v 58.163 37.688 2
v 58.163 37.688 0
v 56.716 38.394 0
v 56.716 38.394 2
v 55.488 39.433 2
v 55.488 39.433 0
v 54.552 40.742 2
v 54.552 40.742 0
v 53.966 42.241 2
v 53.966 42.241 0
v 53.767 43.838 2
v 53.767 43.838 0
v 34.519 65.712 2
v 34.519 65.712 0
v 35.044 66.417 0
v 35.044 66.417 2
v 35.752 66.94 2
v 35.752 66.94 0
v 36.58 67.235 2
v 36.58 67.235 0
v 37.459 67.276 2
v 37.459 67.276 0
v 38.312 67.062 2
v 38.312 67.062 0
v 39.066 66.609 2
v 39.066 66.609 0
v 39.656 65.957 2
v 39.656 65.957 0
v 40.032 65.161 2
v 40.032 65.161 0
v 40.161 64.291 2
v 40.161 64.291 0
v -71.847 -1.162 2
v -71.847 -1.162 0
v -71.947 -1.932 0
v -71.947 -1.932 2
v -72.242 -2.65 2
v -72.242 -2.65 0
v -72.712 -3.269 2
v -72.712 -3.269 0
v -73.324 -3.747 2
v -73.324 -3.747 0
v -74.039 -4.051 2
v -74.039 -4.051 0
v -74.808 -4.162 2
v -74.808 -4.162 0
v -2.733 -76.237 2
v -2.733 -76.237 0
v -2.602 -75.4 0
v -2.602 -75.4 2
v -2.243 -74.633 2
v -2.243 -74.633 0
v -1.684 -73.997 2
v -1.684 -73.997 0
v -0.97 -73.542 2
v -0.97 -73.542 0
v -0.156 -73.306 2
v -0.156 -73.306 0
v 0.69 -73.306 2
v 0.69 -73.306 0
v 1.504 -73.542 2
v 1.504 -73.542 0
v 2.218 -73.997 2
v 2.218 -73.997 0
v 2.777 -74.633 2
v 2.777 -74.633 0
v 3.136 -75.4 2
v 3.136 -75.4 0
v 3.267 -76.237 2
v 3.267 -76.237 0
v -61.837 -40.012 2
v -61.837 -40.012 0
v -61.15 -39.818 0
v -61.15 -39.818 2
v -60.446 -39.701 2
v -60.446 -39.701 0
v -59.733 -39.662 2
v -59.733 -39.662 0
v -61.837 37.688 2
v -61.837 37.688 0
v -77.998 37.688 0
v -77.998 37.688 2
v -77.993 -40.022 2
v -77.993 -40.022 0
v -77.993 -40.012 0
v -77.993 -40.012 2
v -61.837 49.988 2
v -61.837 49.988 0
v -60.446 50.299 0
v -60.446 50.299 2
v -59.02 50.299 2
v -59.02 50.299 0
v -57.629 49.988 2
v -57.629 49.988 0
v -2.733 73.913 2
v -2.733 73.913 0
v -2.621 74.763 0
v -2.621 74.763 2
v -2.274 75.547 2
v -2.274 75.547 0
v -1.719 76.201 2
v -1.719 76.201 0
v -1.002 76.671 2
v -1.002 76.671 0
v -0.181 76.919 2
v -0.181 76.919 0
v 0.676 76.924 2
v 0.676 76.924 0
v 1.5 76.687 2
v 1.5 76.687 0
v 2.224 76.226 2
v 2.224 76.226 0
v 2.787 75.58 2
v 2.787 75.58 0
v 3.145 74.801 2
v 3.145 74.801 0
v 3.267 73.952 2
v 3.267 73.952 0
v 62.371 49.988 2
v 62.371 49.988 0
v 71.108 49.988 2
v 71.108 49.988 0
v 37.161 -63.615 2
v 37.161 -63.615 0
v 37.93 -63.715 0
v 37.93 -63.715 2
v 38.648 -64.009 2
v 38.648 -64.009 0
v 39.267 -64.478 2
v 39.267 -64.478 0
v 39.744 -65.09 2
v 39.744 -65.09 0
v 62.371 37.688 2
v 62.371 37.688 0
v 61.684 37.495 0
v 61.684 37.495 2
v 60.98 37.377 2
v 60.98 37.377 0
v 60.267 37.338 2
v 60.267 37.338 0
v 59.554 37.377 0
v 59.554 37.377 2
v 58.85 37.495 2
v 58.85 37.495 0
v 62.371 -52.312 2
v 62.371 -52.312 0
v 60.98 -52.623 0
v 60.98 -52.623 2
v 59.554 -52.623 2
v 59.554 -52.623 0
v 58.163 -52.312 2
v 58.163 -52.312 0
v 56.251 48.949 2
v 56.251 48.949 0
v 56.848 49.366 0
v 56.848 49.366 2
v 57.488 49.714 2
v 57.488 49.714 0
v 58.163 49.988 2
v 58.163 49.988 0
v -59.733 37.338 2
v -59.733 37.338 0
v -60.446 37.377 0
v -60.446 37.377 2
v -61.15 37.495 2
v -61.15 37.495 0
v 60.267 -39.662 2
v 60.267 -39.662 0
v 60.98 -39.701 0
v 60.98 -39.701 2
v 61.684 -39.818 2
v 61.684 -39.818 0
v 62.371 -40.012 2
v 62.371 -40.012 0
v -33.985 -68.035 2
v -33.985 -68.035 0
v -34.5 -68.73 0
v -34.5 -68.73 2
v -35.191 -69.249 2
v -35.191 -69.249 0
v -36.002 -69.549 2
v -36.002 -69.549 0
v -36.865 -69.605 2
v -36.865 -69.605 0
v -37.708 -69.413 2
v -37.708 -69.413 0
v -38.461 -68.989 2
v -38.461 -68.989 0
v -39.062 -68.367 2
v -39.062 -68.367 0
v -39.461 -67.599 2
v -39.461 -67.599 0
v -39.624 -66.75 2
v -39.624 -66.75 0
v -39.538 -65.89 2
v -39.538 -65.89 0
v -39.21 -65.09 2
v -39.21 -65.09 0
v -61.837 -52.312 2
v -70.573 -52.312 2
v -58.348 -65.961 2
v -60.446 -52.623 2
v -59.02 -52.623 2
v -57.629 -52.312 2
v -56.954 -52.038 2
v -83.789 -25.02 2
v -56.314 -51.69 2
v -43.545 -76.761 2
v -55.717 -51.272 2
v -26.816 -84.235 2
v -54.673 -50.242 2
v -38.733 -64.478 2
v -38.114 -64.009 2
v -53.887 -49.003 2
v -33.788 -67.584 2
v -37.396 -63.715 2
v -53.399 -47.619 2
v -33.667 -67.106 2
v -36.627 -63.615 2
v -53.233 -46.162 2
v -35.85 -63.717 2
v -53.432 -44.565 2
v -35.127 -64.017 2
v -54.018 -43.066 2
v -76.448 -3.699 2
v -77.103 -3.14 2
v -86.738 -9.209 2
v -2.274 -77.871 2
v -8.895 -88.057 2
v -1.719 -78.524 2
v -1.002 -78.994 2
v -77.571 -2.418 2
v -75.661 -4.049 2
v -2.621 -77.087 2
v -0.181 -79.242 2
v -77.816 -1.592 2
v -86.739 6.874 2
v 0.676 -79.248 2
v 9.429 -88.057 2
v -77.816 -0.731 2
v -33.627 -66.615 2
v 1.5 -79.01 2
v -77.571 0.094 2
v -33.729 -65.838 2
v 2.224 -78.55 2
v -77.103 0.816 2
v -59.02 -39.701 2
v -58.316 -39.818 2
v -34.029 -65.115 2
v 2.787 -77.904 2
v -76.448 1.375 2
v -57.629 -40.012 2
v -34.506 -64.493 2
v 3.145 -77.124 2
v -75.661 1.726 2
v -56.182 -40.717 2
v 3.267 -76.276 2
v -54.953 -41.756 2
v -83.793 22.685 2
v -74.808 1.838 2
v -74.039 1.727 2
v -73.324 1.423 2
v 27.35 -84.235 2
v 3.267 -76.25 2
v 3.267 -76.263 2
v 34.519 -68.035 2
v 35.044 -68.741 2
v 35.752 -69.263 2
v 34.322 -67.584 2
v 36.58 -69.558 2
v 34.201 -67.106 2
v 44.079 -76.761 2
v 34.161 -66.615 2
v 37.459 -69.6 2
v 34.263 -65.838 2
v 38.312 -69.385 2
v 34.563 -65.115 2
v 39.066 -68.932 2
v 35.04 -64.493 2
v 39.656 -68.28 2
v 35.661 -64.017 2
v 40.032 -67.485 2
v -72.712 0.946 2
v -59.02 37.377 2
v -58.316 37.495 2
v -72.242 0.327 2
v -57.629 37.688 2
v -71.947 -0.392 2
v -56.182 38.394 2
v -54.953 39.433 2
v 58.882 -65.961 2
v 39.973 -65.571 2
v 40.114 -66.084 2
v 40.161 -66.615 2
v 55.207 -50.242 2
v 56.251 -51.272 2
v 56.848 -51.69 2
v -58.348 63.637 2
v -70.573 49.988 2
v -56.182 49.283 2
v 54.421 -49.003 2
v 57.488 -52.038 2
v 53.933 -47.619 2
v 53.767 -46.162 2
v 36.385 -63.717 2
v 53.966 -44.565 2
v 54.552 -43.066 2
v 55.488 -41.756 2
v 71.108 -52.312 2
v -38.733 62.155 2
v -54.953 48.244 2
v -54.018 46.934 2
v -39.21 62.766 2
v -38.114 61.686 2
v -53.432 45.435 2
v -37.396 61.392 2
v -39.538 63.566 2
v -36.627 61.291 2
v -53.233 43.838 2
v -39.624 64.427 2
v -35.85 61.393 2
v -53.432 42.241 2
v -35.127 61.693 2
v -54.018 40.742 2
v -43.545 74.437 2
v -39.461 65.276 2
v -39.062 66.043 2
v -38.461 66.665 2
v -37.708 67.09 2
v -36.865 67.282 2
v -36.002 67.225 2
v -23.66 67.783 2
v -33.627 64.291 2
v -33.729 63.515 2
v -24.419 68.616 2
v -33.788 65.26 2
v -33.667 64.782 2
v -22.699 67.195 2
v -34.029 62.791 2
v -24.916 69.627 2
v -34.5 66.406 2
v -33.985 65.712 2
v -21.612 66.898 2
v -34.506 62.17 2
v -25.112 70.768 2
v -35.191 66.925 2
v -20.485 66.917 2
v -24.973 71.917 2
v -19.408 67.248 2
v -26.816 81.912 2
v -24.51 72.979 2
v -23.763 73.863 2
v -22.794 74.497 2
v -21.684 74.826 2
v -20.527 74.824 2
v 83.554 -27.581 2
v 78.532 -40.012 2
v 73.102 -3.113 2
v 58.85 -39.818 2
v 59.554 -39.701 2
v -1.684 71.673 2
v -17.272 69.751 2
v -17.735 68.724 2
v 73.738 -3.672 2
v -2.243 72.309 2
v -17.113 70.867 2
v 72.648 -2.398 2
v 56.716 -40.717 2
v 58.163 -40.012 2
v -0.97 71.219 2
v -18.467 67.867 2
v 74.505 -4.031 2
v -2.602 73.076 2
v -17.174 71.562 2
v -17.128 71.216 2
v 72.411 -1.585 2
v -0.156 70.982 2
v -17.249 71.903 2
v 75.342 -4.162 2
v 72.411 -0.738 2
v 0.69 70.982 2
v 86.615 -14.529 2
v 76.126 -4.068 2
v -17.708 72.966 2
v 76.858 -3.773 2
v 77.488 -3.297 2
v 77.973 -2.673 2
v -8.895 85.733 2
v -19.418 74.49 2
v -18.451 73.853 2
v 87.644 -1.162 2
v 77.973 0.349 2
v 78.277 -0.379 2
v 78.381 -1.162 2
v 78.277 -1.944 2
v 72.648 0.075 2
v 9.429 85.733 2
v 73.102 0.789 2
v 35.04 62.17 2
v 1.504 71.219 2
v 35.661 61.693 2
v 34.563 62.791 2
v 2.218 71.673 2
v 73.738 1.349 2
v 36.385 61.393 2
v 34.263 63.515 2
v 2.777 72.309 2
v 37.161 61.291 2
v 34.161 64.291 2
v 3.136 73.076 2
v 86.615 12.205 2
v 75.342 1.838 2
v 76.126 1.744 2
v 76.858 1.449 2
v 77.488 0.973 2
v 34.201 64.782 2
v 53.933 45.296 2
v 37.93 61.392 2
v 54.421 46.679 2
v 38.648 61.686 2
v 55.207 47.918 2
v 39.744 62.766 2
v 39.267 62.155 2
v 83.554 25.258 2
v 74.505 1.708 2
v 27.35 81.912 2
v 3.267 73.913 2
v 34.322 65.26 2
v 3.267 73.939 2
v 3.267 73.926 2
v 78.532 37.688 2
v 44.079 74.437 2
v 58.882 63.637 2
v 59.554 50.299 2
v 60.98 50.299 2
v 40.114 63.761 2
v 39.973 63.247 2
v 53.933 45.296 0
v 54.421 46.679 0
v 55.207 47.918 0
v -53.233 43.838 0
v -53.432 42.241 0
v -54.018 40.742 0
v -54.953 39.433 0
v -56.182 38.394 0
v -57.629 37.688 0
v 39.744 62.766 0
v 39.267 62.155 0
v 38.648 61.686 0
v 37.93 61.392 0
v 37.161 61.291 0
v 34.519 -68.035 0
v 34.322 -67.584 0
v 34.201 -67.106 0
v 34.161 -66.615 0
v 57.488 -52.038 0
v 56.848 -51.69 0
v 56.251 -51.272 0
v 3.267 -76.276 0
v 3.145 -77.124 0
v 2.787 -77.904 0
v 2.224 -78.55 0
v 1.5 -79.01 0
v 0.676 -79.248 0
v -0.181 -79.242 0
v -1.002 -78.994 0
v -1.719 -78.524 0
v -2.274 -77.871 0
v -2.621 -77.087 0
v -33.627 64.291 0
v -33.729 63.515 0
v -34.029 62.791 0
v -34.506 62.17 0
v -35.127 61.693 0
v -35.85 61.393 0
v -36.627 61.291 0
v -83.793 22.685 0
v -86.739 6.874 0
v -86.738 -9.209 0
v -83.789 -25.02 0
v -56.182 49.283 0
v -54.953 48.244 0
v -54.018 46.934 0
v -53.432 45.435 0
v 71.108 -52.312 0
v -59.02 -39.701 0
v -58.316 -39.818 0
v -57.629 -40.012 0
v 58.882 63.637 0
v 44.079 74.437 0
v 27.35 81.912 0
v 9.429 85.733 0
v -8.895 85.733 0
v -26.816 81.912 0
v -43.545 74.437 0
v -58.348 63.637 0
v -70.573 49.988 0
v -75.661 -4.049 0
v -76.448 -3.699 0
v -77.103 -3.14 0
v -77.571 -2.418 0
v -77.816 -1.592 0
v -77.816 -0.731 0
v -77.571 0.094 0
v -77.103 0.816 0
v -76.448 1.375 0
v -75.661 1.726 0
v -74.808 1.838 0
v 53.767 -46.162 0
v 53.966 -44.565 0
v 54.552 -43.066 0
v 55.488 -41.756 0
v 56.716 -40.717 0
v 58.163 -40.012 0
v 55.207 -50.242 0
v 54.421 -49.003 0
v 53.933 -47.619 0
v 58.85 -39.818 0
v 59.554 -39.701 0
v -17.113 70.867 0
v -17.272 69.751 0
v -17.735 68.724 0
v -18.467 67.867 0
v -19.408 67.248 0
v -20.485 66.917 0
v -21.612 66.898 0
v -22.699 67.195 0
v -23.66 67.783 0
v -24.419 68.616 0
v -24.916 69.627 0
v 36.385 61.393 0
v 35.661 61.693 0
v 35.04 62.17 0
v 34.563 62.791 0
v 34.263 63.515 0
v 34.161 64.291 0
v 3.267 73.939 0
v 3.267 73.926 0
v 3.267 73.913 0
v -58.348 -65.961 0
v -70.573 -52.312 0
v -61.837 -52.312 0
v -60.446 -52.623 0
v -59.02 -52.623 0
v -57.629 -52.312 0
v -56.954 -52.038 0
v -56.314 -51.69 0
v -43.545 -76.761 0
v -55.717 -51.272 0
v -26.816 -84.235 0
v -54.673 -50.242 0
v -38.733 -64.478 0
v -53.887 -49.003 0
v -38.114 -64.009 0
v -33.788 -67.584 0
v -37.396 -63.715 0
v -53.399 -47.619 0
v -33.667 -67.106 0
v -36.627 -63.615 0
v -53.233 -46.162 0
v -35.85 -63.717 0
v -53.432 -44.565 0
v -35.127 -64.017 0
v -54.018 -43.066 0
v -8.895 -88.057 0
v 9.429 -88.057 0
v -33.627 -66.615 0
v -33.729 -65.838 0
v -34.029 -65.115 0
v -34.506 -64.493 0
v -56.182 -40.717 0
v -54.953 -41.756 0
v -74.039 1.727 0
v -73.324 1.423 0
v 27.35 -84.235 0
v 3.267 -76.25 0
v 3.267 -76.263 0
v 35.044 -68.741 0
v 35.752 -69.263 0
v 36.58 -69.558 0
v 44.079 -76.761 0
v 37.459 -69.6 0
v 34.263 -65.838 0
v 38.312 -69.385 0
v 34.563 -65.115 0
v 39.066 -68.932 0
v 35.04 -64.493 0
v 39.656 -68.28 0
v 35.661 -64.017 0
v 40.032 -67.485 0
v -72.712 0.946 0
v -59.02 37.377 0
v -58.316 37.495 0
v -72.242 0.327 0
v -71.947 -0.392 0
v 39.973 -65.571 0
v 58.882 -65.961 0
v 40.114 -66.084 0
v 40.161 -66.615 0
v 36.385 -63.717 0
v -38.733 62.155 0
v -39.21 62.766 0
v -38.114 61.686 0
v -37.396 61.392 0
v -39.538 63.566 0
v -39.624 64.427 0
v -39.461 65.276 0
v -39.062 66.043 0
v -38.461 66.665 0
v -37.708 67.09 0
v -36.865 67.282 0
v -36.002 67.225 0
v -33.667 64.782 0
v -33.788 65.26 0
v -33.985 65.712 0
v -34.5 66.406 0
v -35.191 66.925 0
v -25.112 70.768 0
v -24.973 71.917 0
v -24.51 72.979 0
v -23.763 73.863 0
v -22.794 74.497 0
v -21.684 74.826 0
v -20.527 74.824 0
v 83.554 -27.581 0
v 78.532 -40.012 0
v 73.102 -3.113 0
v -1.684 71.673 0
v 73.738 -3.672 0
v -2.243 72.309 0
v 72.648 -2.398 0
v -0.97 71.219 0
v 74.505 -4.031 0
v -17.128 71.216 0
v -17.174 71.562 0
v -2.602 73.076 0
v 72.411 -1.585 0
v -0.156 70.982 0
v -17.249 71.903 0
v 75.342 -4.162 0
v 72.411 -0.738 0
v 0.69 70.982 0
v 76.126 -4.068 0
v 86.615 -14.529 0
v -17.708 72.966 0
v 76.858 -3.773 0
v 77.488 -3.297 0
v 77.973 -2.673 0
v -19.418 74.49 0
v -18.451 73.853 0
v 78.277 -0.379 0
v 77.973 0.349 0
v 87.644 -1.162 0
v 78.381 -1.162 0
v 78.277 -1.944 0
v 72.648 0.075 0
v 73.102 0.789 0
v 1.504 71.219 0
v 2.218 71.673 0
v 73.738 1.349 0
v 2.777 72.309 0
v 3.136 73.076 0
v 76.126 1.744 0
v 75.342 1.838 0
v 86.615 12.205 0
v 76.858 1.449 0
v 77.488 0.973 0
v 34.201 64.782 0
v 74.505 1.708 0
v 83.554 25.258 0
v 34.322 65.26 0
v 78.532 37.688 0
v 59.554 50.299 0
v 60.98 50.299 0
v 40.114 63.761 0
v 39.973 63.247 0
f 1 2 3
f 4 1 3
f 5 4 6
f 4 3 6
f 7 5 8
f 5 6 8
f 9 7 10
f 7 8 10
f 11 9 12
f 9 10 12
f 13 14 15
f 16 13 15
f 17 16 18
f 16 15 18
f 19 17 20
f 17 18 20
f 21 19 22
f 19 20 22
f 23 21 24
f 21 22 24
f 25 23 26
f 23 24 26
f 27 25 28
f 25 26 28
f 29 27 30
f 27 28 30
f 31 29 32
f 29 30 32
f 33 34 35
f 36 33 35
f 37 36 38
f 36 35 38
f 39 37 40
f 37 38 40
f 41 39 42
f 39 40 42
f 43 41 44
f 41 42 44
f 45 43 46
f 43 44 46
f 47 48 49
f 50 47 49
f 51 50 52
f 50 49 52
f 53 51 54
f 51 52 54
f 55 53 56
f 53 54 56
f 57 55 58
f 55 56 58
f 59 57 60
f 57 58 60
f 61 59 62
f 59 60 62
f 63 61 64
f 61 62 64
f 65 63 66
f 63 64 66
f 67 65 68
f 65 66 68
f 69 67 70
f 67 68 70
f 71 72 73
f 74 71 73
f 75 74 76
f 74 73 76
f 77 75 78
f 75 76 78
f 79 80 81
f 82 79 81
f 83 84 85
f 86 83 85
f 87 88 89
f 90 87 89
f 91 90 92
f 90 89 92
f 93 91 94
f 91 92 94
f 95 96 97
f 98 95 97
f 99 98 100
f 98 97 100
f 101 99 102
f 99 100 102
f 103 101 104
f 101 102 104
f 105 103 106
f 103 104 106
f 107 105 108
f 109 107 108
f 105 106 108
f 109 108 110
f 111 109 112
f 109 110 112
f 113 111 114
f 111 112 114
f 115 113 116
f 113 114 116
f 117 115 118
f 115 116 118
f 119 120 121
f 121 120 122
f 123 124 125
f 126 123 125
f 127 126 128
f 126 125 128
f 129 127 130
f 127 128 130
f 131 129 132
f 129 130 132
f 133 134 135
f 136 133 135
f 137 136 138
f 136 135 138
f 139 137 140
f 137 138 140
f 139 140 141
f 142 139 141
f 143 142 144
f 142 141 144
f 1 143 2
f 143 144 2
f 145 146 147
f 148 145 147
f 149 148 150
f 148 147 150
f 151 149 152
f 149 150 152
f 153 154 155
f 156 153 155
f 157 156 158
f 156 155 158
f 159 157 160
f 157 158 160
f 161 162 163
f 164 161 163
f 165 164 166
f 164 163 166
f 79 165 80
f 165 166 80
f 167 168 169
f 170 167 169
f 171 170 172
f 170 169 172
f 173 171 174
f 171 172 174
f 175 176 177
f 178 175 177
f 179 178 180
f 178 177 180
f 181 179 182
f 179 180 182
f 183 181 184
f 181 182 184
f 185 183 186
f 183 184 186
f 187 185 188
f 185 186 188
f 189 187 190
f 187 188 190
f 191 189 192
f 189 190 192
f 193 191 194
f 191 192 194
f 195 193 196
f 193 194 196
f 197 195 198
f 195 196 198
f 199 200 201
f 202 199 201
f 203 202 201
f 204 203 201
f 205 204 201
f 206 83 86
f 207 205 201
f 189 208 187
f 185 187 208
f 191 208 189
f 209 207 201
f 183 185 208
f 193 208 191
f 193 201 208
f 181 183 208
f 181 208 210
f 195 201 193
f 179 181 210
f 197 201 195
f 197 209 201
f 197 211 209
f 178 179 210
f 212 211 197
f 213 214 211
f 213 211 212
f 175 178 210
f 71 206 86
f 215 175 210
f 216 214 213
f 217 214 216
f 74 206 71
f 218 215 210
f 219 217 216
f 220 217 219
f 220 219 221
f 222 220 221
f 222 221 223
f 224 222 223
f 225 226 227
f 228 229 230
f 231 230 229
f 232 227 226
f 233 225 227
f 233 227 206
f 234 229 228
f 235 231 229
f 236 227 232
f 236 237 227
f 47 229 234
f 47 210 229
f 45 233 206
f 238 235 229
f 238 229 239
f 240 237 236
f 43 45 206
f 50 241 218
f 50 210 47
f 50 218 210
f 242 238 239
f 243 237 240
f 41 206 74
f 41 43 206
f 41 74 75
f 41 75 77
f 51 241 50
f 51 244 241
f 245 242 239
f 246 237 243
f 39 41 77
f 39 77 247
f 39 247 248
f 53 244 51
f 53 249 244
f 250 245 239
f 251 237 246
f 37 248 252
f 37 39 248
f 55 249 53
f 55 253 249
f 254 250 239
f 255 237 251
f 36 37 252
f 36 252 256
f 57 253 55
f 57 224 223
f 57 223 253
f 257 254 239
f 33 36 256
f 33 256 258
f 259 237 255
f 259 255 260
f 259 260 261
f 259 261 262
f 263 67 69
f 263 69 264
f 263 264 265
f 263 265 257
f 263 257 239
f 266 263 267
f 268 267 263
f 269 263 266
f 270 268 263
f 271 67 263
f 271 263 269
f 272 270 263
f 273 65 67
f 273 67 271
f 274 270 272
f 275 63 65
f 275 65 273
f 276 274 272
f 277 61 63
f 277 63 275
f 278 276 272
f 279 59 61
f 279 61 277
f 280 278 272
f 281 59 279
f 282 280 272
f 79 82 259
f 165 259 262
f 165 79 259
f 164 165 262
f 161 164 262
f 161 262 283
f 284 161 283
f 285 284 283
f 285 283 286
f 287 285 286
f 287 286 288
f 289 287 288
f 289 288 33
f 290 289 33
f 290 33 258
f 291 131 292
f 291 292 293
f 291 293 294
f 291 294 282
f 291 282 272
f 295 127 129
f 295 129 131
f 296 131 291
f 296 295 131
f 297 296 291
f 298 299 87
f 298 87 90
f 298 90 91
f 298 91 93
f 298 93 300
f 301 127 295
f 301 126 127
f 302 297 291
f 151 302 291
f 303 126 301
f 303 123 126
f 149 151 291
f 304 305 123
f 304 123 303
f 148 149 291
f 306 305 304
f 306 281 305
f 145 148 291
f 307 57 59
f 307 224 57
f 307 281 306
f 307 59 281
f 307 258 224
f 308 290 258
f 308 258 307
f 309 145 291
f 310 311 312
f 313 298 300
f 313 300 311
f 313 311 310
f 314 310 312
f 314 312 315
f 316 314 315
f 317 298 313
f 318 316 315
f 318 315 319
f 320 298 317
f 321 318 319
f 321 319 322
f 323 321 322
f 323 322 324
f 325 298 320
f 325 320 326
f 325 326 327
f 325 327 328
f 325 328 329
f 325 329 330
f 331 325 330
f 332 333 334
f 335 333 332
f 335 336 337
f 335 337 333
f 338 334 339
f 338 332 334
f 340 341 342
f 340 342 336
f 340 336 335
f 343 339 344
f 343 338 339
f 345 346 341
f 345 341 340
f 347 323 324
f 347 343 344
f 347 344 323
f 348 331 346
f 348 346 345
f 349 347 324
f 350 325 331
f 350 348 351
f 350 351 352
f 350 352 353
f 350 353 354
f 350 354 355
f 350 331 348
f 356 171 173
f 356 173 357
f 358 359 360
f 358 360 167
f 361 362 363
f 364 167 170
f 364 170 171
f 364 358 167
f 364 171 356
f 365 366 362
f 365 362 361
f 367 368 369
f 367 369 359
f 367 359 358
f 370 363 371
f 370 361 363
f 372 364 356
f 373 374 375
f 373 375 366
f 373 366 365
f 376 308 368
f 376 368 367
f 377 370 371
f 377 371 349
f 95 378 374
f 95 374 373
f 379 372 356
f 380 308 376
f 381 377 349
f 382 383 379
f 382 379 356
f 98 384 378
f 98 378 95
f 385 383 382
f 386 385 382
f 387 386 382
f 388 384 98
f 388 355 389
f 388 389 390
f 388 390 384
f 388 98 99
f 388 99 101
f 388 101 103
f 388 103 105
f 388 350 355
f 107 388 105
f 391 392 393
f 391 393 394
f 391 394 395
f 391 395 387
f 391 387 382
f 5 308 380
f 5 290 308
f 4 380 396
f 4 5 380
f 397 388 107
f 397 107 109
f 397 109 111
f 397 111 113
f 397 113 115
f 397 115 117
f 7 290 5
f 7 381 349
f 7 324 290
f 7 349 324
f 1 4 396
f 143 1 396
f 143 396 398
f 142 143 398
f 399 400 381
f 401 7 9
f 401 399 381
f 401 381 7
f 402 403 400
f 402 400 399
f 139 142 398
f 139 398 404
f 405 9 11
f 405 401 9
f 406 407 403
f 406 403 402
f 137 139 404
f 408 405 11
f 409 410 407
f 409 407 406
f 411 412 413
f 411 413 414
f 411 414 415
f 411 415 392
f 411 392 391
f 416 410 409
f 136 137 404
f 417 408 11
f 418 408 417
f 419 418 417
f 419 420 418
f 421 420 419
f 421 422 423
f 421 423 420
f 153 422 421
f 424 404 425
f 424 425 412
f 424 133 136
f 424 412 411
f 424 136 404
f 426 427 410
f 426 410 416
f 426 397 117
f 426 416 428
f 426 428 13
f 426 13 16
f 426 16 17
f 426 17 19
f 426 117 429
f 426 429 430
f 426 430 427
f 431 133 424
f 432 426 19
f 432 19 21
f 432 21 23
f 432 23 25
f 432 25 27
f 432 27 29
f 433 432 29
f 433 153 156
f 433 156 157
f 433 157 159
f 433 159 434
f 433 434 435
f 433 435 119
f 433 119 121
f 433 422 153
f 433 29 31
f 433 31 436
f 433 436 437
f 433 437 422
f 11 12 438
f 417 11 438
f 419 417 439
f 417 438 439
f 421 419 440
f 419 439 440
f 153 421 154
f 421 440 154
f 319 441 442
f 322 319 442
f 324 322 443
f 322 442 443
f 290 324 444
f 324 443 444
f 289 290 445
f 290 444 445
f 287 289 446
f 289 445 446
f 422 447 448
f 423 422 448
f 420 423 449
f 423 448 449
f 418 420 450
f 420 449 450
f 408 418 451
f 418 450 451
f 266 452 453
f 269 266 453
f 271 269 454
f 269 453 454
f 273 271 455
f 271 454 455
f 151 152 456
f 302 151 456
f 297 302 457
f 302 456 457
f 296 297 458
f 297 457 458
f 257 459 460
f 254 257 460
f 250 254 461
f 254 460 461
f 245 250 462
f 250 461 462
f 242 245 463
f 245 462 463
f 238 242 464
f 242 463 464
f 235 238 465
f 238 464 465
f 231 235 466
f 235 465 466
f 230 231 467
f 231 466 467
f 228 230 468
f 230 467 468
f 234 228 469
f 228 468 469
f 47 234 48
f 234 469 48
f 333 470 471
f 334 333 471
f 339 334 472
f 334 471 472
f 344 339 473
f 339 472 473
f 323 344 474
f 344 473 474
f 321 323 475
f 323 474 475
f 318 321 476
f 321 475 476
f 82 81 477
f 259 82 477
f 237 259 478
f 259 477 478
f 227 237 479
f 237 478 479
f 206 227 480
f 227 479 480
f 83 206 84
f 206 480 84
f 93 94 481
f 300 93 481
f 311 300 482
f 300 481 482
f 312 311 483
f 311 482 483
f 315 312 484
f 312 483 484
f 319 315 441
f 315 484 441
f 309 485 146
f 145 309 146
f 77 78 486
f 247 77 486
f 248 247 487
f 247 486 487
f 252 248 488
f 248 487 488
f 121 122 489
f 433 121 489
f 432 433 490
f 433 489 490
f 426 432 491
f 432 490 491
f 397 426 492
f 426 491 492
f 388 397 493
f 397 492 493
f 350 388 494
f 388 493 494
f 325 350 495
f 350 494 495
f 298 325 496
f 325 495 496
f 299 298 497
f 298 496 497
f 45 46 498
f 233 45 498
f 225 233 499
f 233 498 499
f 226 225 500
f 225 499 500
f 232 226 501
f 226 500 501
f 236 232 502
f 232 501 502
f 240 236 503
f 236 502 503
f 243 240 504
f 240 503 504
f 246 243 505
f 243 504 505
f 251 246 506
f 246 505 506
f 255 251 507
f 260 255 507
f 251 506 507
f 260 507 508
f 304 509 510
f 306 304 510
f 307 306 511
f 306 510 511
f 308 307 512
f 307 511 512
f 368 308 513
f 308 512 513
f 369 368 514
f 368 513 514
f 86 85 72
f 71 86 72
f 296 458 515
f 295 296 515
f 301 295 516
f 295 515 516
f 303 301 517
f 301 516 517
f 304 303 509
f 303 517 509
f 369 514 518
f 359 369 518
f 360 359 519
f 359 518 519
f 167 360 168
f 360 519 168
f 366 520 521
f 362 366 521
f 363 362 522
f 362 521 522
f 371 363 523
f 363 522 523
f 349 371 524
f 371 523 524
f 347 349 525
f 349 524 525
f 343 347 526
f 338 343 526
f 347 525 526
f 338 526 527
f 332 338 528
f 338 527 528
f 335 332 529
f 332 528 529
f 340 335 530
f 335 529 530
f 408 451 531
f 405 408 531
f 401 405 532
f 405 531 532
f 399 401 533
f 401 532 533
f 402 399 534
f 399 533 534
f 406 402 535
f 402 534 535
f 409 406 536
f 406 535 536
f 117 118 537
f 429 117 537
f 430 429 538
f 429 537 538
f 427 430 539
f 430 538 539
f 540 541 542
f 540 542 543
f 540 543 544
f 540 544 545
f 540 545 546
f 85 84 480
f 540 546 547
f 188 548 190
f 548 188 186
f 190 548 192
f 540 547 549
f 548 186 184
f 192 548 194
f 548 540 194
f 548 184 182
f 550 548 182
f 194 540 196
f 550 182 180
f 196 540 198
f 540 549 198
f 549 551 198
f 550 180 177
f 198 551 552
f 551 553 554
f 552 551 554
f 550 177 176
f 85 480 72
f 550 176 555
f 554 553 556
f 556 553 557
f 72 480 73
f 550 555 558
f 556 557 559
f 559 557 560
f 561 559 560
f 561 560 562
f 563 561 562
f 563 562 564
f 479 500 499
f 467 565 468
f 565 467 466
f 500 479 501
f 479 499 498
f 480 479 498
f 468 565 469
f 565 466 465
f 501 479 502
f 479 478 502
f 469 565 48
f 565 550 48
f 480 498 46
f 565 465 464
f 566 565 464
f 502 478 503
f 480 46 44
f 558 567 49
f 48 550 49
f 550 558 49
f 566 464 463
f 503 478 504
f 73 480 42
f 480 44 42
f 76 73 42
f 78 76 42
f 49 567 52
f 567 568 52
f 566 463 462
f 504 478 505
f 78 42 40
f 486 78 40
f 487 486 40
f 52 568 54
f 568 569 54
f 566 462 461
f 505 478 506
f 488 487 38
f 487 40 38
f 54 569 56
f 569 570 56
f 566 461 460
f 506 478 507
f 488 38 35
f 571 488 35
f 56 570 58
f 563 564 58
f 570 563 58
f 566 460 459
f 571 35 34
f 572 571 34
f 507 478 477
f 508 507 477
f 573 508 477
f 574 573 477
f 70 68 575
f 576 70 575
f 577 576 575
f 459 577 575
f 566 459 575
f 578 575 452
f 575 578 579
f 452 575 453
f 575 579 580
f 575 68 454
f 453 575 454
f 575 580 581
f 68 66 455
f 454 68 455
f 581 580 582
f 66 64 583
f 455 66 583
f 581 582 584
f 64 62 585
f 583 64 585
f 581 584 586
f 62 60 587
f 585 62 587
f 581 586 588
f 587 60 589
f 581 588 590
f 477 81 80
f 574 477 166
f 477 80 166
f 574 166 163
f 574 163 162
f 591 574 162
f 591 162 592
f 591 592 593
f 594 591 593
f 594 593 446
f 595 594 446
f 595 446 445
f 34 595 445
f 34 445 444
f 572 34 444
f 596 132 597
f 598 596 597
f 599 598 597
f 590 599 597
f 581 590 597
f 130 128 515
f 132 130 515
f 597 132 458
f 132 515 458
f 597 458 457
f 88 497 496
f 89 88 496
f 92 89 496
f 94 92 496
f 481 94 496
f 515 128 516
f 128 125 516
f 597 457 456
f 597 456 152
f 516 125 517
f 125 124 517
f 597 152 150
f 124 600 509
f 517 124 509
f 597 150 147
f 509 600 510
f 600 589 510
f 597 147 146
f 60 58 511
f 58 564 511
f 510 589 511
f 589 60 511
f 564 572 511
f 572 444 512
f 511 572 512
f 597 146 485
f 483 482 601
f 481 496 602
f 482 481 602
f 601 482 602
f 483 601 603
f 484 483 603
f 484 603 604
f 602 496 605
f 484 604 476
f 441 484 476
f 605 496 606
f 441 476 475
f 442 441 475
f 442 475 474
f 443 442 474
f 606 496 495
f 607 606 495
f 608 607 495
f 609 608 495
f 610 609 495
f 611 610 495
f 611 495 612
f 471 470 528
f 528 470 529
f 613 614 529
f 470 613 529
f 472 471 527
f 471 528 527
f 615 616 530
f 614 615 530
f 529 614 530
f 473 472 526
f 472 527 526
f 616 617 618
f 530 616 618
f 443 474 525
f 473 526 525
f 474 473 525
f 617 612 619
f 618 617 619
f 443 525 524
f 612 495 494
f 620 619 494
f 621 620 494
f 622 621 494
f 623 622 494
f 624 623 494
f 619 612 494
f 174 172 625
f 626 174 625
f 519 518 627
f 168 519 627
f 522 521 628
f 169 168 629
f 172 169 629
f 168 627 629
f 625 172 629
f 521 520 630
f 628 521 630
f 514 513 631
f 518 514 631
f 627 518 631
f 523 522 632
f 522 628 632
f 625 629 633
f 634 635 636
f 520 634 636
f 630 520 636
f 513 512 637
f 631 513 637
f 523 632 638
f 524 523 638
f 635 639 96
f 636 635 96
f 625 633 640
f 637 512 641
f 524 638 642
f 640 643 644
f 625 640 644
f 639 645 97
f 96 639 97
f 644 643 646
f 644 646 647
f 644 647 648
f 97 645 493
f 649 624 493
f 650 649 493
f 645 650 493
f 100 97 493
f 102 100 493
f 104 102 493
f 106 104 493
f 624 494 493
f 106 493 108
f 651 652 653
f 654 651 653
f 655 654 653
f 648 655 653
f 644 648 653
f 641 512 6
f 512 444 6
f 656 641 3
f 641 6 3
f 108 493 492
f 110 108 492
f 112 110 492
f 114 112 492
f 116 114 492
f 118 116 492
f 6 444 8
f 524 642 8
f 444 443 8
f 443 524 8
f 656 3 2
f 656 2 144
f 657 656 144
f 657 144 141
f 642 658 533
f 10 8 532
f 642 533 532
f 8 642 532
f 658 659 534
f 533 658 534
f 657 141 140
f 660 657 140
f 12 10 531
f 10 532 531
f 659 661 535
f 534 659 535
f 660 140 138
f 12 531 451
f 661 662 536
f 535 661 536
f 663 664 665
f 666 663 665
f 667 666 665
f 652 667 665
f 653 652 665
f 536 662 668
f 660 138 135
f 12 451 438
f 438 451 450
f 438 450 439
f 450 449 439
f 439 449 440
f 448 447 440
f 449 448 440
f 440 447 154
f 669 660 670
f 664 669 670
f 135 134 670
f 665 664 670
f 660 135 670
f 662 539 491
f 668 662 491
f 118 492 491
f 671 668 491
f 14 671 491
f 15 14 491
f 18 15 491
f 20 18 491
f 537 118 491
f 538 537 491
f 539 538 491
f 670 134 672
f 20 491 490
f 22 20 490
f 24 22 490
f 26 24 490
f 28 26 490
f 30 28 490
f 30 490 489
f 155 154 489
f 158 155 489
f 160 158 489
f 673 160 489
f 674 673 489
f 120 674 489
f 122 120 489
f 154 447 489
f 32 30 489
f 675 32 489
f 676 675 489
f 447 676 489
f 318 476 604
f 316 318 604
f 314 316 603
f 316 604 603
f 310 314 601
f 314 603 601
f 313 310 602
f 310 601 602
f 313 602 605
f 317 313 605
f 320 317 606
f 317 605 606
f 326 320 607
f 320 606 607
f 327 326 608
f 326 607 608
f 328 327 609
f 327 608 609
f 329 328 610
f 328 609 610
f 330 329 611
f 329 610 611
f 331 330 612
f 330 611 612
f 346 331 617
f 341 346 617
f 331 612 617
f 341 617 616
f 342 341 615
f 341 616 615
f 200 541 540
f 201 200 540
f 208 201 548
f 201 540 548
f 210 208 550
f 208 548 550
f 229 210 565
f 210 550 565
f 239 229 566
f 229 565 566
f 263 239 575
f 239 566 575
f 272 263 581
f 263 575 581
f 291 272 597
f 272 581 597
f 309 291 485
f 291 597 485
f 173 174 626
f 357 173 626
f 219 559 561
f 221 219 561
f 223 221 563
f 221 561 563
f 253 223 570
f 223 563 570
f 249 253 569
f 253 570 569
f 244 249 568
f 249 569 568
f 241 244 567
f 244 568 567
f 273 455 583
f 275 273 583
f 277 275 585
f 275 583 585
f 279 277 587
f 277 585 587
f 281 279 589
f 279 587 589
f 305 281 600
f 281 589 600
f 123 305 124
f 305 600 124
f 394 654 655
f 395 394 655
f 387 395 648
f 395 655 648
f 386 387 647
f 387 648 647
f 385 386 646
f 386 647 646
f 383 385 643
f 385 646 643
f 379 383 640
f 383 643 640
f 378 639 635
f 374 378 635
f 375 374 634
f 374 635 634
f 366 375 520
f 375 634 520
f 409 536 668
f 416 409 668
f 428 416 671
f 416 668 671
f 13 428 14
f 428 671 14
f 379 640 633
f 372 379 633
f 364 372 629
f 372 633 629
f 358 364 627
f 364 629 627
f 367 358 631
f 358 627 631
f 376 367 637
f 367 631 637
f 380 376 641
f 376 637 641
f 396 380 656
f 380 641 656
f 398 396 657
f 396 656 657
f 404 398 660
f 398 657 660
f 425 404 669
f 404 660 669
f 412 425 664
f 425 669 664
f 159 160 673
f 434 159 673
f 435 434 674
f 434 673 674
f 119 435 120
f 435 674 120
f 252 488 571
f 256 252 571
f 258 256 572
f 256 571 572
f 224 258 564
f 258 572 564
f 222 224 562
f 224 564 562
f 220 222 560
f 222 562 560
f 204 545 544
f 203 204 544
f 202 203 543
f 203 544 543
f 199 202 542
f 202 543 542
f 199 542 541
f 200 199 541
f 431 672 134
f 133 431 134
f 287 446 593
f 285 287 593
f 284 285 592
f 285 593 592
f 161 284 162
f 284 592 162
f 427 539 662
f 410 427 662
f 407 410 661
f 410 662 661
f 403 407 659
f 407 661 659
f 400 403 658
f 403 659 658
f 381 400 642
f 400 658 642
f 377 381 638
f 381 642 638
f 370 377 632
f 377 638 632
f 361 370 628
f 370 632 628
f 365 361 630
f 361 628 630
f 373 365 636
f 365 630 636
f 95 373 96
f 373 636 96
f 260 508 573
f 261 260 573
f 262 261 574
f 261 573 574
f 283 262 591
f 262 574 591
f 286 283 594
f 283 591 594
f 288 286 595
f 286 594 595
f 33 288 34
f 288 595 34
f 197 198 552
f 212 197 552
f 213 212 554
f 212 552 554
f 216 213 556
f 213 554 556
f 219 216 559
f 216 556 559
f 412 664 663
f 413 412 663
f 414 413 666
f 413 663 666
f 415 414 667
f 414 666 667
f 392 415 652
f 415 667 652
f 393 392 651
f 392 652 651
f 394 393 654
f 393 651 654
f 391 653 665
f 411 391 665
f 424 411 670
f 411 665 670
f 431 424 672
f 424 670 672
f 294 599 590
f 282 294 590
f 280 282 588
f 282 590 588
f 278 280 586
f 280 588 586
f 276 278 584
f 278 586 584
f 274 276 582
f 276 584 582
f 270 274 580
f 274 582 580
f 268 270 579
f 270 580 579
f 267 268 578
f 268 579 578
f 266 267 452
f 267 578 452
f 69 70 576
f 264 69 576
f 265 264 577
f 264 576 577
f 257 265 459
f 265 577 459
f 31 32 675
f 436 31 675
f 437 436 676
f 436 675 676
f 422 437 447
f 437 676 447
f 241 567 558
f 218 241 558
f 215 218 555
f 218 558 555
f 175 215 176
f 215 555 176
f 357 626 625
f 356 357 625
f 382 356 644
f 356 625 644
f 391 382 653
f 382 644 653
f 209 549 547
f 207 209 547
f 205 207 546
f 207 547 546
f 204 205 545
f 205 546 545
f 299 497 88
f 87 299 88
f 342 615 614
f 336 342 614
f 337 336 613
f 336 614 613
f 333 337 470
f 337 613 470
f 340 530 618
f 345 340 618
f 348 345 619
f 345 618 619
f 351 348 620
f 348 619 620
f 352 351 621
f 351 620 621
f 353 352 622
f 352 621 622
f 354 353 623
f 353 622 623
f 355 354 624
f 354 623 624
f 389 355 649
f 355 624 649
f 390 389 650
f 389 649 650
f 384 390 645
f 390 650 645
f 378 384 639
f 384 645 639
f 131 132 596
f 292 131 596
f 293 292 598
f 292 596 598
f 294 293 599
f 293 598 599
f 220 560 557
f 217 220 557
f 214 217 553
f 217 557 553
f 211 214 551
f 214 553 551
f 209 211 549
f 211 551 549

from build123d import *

# Parameters (mm, degrees)
F0_W     = 73.7878350085
F0_H     = 90
F1_DEPTH = 2


with BuildPart() as f1:
    # F0 (on Top) → F1 (new body)
    with BuildSketch(Plane.XY):
        with BuildLine():
            ThreePointArc((39.7444489138, 62.7662374325), (48.4949826486, 56.4517818988), (56.25072261, 48.9489366399))
            ThreePointArc((56.25072261, 48.9489366399), (57.1629943627, 49.5491889391), (58.1628805597, 49.9882449339))
            ThreePointArc((58.1628805597, 49.9882449339), (60.2670431009, 50.3382449339), (62.3712056422, 49.9882449339))
            Line((62.3712056422, 49.9882449339), (71.1075096636, 49.9882449339))
            ThreePointArc((71.1075096636, 49.9882449339), (0.2670431009, 86.2149821287), (-70.5734234617, 49.9882449339))
            Line((-70.5734234617, 49.9882449339), (-61.8371194403, 49.9882449339))
            ThreePointArc((-61.8371194403, 49.9882449339), (-59.7329568991, 50.3382449339), (-57.6287943578, 49.9882449339))
            ThreePointArc((-57.6287943578, 49.9882449339), (-56.6289081608, 49.5491889391), (-55.7166364081, 48.9489366399))
            ThreePointArc((-55.7166364081, 48.9489366399), (-47.9608964467, 56.4517818988), (-39.210362712, 62.7662374325))
            ThreePointArc((-39.210362712, 62.7662374325), (-38.0999813971, 66.9046437634), (-33.9845676129, 65.7118642328))
            ThreePointArc((-33.9845676129, 65.7118642328), (-29.5146570092, 67.8187069008), (-24.9159238599, 69.6271704072))
            ThreePointArc((-24.9159238599, 69.6271704072), (-22.2511598208, 74.7016983457), (-17.2493627904, 71.9028007682))
            ThreePointArc((-17.2493627904, 71.9028007682), (-10.040168129, 73.2628053376), (-2.7327040585, 73.9132428466))
            ThreePointArc((-2.7327040585, 73.9132428466), (0.2475684804, 76.9521280563), (3.2670431009, 73.9521912671))
            ThreePointArc((3.2670431009, 73.9521912671), (3.2669798901, 73.9327166465), (3.2667902604, 73.9132428466))
            ThreePointArc((3.2667902604, 73.9132428466), (19.3387910188, 71.5123271502), (34.5186538148, 65.7118642328))
            ThreePointArc((34.5186538148, 65.7118642328), (37.8934493863, 67.2004280253), (40.1609606052, 64.2912253535))
            ThreePointArc((40.1609606052, 64.2912253535), (40.0549599941, 63.5008029746), (39.7444489138, 62.7662374325))
        make_face()
        with BuildLine():
            Line((-33.6268744033, 64.2912253535), (34.1609606052, 64.2912253535))
            ThreePointArc((34.1609606052, 64.2912253535), (34.2517579334, 65.0237141345), (34.5186538148, 65.7118642328))
            ThreePointArc((34.5186538148, 65.7118642328), (19.3387910188, 71.5123271502), (3.2667902604, 73.9132428466))
            ThreePointArc((3.2667902604, 73.9132428466), (0.2670431009, 70.9521912671), (-2.7327040585, 73.9132428466))
            ThreePointArc((-2.7327040585, 73.9132428466), (-10.040168129, 73.2628053376), (-17.2493627904, 71.9028007682))
            ThreePointArc((-17.2493627904, 71.9028007682), (-17.1471933384, 71.3894027327), (-17.1129413209, 70.8670590345))
            ThreePointArc((-17.1129413209, 70.8670590345), (-20.4852193108, 66.9166204414), (-24.9159238599, 69.6271704072))
            ThreePointArc((-24.9159238599, 69.6271704072), (-29.5146570092, 67.8187069008), (-33.9845676129, 65.7118642328))
            ThreePointArc((-33.9845676129, 65.7118642328), (-33.7176717315, 65.0237141345), (-33.6268744033, 64.2912253535))
        make_face()
        with BuildLine():
            Line((-36.6268744033, 43.8382449339), (37.1609606052, 43.8382449339))
            Line((37.1609606052, 43.8382449339), (37.1609606052, 49.2871185703))
            ThreePointArc((37.1609606052, 49.2871185703), (0.2670431009, 61.3382449339), (-36.6268744033, 49.2871185703))
            Line((-36.6268744033, 49.2871185703), (-36.6268744033, 43.8382449339))
        make_face()
        with Locations((0.2670431009, -1.1617550661)):
            Rectangle(F0_W, F0_H)
        with BuildLine():
            ThreePointArc((-36.6268744033, 49.2871185703), (0.2670431009, 61.3382449339), (37.1609606052, 49.2871185703))
            Line((37.1609606052, 49.2871185703), (37.1609606052, 61.2912253535))
            ThreePointArc((37.1609606052, 61.2912253535), (35.0396402617, 62.1699050099), (34.1609606052, 64.2912253535))
            Line((34.1609606052, 64.2912253535), (-33.6268744033, 64.2912253535))
            ThreePointArc((-33.6268744033, 64.2912253535), (-34.5055540598, 62.1699050099), (-36.6268744033, 61.2912253535))
            Line((-36.6268744033, 61.2912253535), (-36.6268744033, 49.2871185703))
        make_face()
        with BuildLine():
            ThreePointArc((-43.1063358313, 43.8382449339), (-39.9589718059, 46.6725184699), (-36.6268744033, 49.2871185703))
            Line((-36.6268744033, 49.2871185703), (-36.6268744033, 61.2912253535))
            ThreePointArc((-36.6268744033, 61.2912253535), (-38.1143279719, 61.6859457367), (-39.210362712, 62.7662374325))
            ThreePointArc((-39.210362712, 62.7662374325), (-47.9608964467, 56.4517818988), (-55.7166364081, 48.9489366399))
            ThreePointArc((-55.7166364081, 48.9489366399), (-53.8867579976, 46.6793641507), (-53.2329568991, 43.8382449339))
            Line((-53.2329568991, 43.8382449339), (-43.1063358313, 43.8382449339))
        make_face()
        with BuildLine():
            Line((-43.1063358313, 43.8382449339), (-36.6268744033, 43.8382449339))
            Line((-36.6268744033, 43.8382449339), (-36.6268744033, 49.2871185703))
            ThreePointArc((-36.6268744033, 49.2871185703), (-39.9589718059, 46.6725184699), (-43.1063358313, 43.8382449339))
        make_face()
        with BuildLine():
            Line((-36.6268744033, -46.1617550661), (-36.6268744033, 43.8382449339))
            Line((-36.6268744033, 43.8382449339), (-43.1063358313, 43.8382449339))
            ThreePointArc((-43.1063358313, 43.8382449339), (-53.217313191, 31.1751222109), (-59.7329568991, 16.3382449339))
            Line((-59.7329568991, 16.3382449339), (-59.7329568991, -18.6617550661))
            ThreePointArc((-59.7329568991, -18.6617550661), (-53.217313191, -33.4986323432), (-43.1063358313, -46.1617550661))
            Line((-43.1063358313, -46.1617550661), (-36.6268744033, -46.1617550661))
        make_face()
        with BuildLine():
            ThreePointArc((-59.7329568991, 16.3382449339), (-53.217313191, 31.1751222109), (-43.1063358313, 43.8382449339))
            Line((-43.1063358313, 43.8382449339), (-53.2329568991, 43.8382449339))
            ThreePointArc((-53.2329568991, 43.8382449339), (-54.4449016555, 40.0585000032), (-57.6287943578, 37.6882449339))
            ThreePointArc((-57.6287943578, 37.6882449339), (-58.6664204487, 37.4263419402), (-59.7329568991, 37.3382449339))
            Line((-59.7329568991, 37.3382449339), (-59.7329568991, 16.3382449339))
        make_face()
        with BuildLine():
            ThreePointArc((-59.7329568991, -18.6617550661), (-62.2329568991, -1.1617550661), (-59.7329568991, 16.3382449339))
            Line((-59.7329568991, 16.3382449339), (-59.7329568991, 37.3382449339))
            ThreePointArc((-59.7329568991, 37.3382449339), (-60.7994933494, 37.4263419402), (-61.8371194403, 37.6882449339))
            Line((-61.8371194403, 37.6882449339), (-64.0441635012, 37.6882449339))
            ThreePointArc((-64.0441635012, 37.6882449339), (-71.6943261151, 20.4441500334), (-74.8079548118, 1.8379920933))
            ThreePointArc((-74.8079548118, 1.8379920933), (-72.7118569492, 0.9457499444), (-71.8469032323, -1.1617550661))
            ThreePointArc((-71.8469032323, -1.1617550661), (-72.7118569492, -3.2692600767), (-74.8079548118, -4.1615022256))
            ThreePointArc((-74.8079548118, -4.1615022256), (-71.6943261151, -22.7676601657), (-64.0441635012, -40.0117550661))
            Line((-64.0441635012, -40.0117550661), (-61.8371194403, -40.0117550661))
            ThreePointArc((-61.8371194403, -40.0117550661), (-60.7994933494, -39.7498520725), (-59.7329568991, -39.6617550661))
            Line((-59.7329568991, -39.6617550661), (-59.7329568991, -18.6617550661))
        make_face()
        with BuildLine():
            Line((-64.0441635012, 37.6882449339), (-77.9977107977, 37.6882449339))
            ThreePointArc((-77.9977107977, 37.6882449339), (-87.1096939106, -1.1674142446), (-77.9926777014, -40.0218927752))
            Line((-77.9926777014, -40.0218927752), (-77.9926777014, -40.0117550661))
            Line((-77.9926777014, -40.0117550661), (-64.0441635012, -40.0117550661))
            ThreePointArc((-64.0441635012, -40.0117550661), (-71.6943261151, -22.7676601657), (-74.8079548118, -4.1615022256))
            ThreePointArc((-74.8079548118, -4.1615022256), (-77.8469032323, -1.1617550661), (-74.8079548118, 1.8379920933))
            ThreePointArc((-74.8079548118, 1.8379920933), (-71.6943261151, 20.4441500334), (-64.0441635012, 37.6882449339))
        make_face()
        with BuildLine():
            Line((-59.7329568991, -18.6617550661), (-59.7329568991, 16.3382449339))
            ThreePointArc((-59.7329568991, 16.3382449339), (-62.2329568991, -1.1617550661), (-59.7329568991, -18.6617550661))
        make_face()
        with BuildLine():
            ThreePointArc((60.2670431009, 16.3382449339), (53.7513993929, 31.1751222109), (43.6404220332, 43.8382449339))
            Line((43.6404220332, 43.8382449339), (37.1609606052, 43.8382449339))
            Line((37.1609606052, 43.8382449339), (37.1609606052, -46.1617550661))
            Line((37.1609606052, -46.1617550661), (43.6404220332, -46.1617550661))
            ThreePointArc((43.6404220332, -46.1617550661), (53.7513993929, -33.4986323432), (60.2670431009, -18.6617550661))
            Line((60.2670431009, -18.6617550661), (60.2670431009, 16.3382449339))
        make_face()
        with BuildLine():
            Line((37.1609606052, 43.8382449339), (43.6404220332, 43.8382449339))
            ThreePointArc((43.6404220332, 43.8382449339), (40.4930580078, 46.6725184699), (37.1609606052, 49.2871185703))
            Line((37.1609606052, 49.2871185703), (37.1609606052, 43.8382449339))
        make_face()
        with BuildLine():
            Line((43.6404220332, 43.8382449339), (53.7670431009, 43.8382449339))
            ThreePointArc((53.7670431009, 43.8382449339), (54.4208441995, 46.6793641507), (56.25072261, 48.9489366399))
            ThreePointArc((56.25072261, 48.9489366399), (48.4949826486, 56.4517818988), (39.7444489138, 62.7662374325))
            ThreePointArc((39.7444489138, 62.7662374325), (38.6484141737, 61.6859457367), (37.1609606052, 61.2912253535))
            Line((37.1609606052, 61.2912253535), (37.1609606052, 49.2871185703))
            ThreePointArc((37.1609606052, 49.2871185703), (40.4930580078, 46.6725184699), (43.6404220332, 43.8382449339))
        make_face()
        with BuildLine():
            ThreePointArc((58.1628805597, 37.6882449339), (54.9789878574, 40.0585000032), (53.7670431009, 43.8382449339))
            Line((53.7670431009, 43.8382449339), (43.6404220332, 43.8382449339))
            ThreePointArc((43.6404220332, 43.8382449339), (53.7513993929, 31.1751222109), (60.2670431009, 16.3382449339))
            Line((60.2670431009, 16.3382449339), (60.2670431009, 37.3382449339))
            ThreePointArc((60.2670431009, 37.3382449339), (59.2005066506, 37.4263419402), (58.1628805597, 37.6882449339))
        make_face()
        with BuildLine():
            ThreePointArc((62.3712056422, 37.6882449339), (61.3335795513, 37.4263419402), (60.2670431009, 37.3382449339))
            Line((60.2670431009, 37.3382449339), (60.2670431009, 16.3382449339))
            ThreePointArc((60.2670431009, 16.3382449339), (62.1388864548, 7.6770796987), (62.7670431009, -1.1617550661))
            ThreePointArc((62.7670431009, -1.1617550661), (62.1388864548, -10.000589831), (60.2670431009, -18.6617550661))
            Line((60.2670431009, -18.6617550661), (60.2670431009, -39.6617550661))
            ThreePointArc((60.2670431009, -39.6617550661), (61.3335795513, -39.7498520725), (62.3712056422, -40.0117550661))
            Line((62.3712056422, -40.0117550661), (64.5782497031, -40.0117550661))
            ThreePointArc((64.5782497031, -40.0117550661), (72.228412317, -22.7676601657), (75.3420410137, -4.1615022256))
            ThreePointArc((75.3420410137, -4.1615022256), (72.3809894341, -1.1617550661), (75.3420410137, 1.8379920933))
            ThreePointArc((75.3420410137, 1.8379920933), (72.228412317, 20.4441500334), (64.5782497031, 37.6882449339))
            Line((64.5782497031, 37.6882449339), (62.3712056422, 37.6882449339))
        make_face()
        with BuildLine():
            Line((78.5317969996, 37.6882449339), (64.5782497031, 37.6882449339))
            ThreePointArc((64.5782497031, 37.6882449339), (72.228412317, 20.4441500334), (75.3420410137, 1.8379920933))
            ThreePointArc((75.3420410137, 1.8379920933), (77.4884944447, 0.9732912169), (78.3809894341, -1.1617550661))
            ThreePointArc((78.3809894341, -1.1617550661), (77.4884944447, -3.2968013492), (75.3420410137, -4.1615022256))
            ThreePointArc((75.3420410137, -4.1615022256), (72.228412317, -22.7676601657), (64.5782497031, -40.0117550661))
            Line((64.5782497031, -40.0117550661), (78.5317969996, -40.0117550661))
            ThreePointArc((78.5317969996, -40.0117550661), (85.3352893384, -21.1138899118), (87.6437802958, -1.1617550661))
            ThreePointArc((87.6437802958, -1.1617550661), (85.3352893384, 18.7903797795), (78.5317969996, 37.6882449339))
        make_face()
        with BuildLine():
            ThreePointArc((62.7670431009, -1.1617550661), (62.1388864548, 7.6770796987), (60.2670431009, 16.3382449339))
            Line((60.2670431009, 16.3382449339), (60.2670431009, -18.6617550661))
            ThreePointArc((60.2670431009, -18.6617550661), (62.1388864548, -10.000589831), (62.7670431009, -1.1617550661))
        make_face()
        with BuildLine():
            ThreePointArc((58.1628805597, -52.3117550661), (57.1629943627, -51.8726990713), (56.25072261, -51.2724467721))
            ThreePointArc((56.25072261, -51.2724467721), (48.4949826486, -58.7752920311), (39.7444489138, -65.0897475648))
            ThreePointArc((39.7444489138, -65.0897475648), (40.0549599941, -65.8243131069), (40.1609606052, -66.6147354858))
            ThreePointArc((40.1609606052, -66.6147354858), (37.8934493863, -69.5239381576), (34.5186538148, -68.035374365))
            ThreePointArc((34.5186538148, -68.035374365), (19.3387910188, -73.8358372824), (3.2667902604, -76.2367529789))
            ThreePointArc((3.2667902604, -76.2367529789), (3.2669798901, -76.2562267788), (3.2670431009, -76.2757013993))
            ThreePointArc((3.2670431009, -76.2757013993), (0.2475684804, -79.2756381885), (-2.7327040585, -76.2367529789))
            ThreePointArc((-2.7327040585, -76.2367529789), (-18.8047048169, -73.8358372824), (-33.9845676129, -68.035374365))
            ThreePointArc((-33.9845676129, -68.035374365), (-38.0999813971, -69.2281538956), (-39.210362712, -65.0897475648))
            ThreePointArc((-39.210362712, -65.0897475648), (-47.9608964467, -58.7752920311), (-55.7166364081, -51.2724467721))
            ThreePointArc((-55.7166364081, -51.2724467721), (-56.6289081608, -51.8726990713), (-57.6287943578, -52.3117550661))
            ThreePointArc((-57.6287943578, -52.3117550661), (-59.7329568991, -52.6617550661), (-61.8371194403, -52.3117550661))
            Line((-61.8371194403, -52.3117550661), (-70.5734234617, -52.3117550661))
            ThreePointArc((-70.5734234617, -52.3117550661), (0.2670431009, -88.538492261), (71.1075096636, -52.3117550661))
            Line((71.1075096636, -52.3117550661), (62.3712056422, -52.3117550661))
            ThreePointArc((62.3712056422, -52.3117550661), (60.2670431009, -52.6617550661), (58.1628805597, -52.3117550661))
        make_face()
        with BuildLine():
            ThreePointArc((34.5186538148, -68.035374365), (34.2517579334, -67.3472242668), (34.1609606052, -66.6147354858))
            Line((34.1609606052, -66.6147354858), (-33.6268744033, -66.6147354858))
            ThreePointArc((-33.6268744033, -66.6147354858), (-33.7176717315, -67.3472242668), (-33.9845676129, -68.035374365))
            ThreePointArc((-33.9845676129, -68.035374365), (-18.8047048169, -73.8358372824), (-2.7327040585, -76.2367529789))
            ThreePointArc((-2.7327040585, -76.2367529789), (0.2670431009, -73.2757013993), (3.2667902604, -76.2367529789))
            ThreePointArc((3.2667902604, -76.2367529789), (19.3387910188, -73.8358372824), (34.5186538148, -68.035374365))
        make_face()
        with BuildLine():
            Line((37.1609606052, -63.6147354858), (37.1609606052, -51.6106287026))
            ThreePointArc((37.1609606052, -51.6106287026), (0.2670431009, -63.6617550661), (-36.6268744033, -51.6106287026))
            Line((-36.6268744033, -51.6106287026), (-36.6268744033, -63.6147354858))
            ThreePointArc((-36.6268744033, -63.6147354858), (-34.5055540598, -64.4934151422), (-33.6268744033, -66.6147354858))
            Line((-33.6268744033, -66.6147354858), (34.1609606052, -66.6147354858))
            ThreePointArc((34.1609606052, -66.6147354858), (35.0396402617, -64.4934151422), (37.1609606052, -63.6147354858))
        make_face()
        with BuildLine():
            Line((37.1609606052, -51.6106287026), (37.1609606052, -46.1617550661))
            Line((37.1609606052, -46.1617550661), (-36.6268744033, -46.1617550661))
            Line((-36.6268744033, -46.1617550661), (-36.6268744033, -51.6106287026))
            ThreePointArc((-36.6268744033, -51.6106287026), (0.2670431009, -63.6617550661), (37.1609606052, -51.6106287026))
        make_face()
        with BuildLine():
            Line((43.6404220332, -46.1617550661), (37.1609606052, -46.1617550661))
            Line((37.1609606052, -46.1617550661), (37.1609606052, -51.6106287026))
            ThreePointArc((37.1609606052, -51.6106287026), (40.4930580078, -48.9960286021), (43.6404220332, -46.1617550661))
        make_face()
        with BuildLine():
            Line((-36.6268744033, -51.6106287026), (-36.6268744033, -46.1617550661))
            Line((-36.6268744033, -46.1617550661), (-43.1063358313, -46.1617550661))
            ThreePointArc((-43.1063358313, -46.1617550661), (-39.9589718059, -48.9960286021), (-36.6268744033, -51.6106287026))
        make_face()
        with BuildLine():
            Line((-53.2329568991, -46.1617550661), (-43.1063358313, -46.1617550661))
            ThreePointArc((-43.1063358313, -46.1617550661), (-53.217313191, -33.4986323432), (-59.7329568991, -18.6617550661))
            Line((-59.7329568991, -18.6617550661), (-59.7329568991, -39.6617550661))
            ThreePointArc((-59.7329568991, -39.6617550661), (-58.6664204487, -39.7498520725), (-57.6287943578, -40.0117550661))
            ThreePointArc((-57.6287943578, -40.0117550661), (-54.4449016555, -42.3820101355), (-53.2329568991, -46.1617550661))
        make_face()
        with BuildLine():
            ThreePointArc((-36.6268744033, -51.6106287026), (-39.9589718059, -48.9960286021), (-43.1063358313, -46.1617550661))
            Line((-43.1063358313, -46.1617550661), (-53.2329568991, -46.1617550661))
            ThreePointArc((-53.2329568991, -46.1617550661), (-53.8867579976, -49.002874283), (-55.7166364081, -51.2724467721))
            ThreePointArc((-55.7166364081, -51.2724467721), (-47.9608964467, -58.7752920311), (-39.210362712, -65.0897475648))
            ThreePointArc((-39.210362712, -65.0897475648), (-38.1143279719, -64.009455869), (-36.6268744033, -63.6147354858))
            Line((-36.6268744033, -63.6147354858), (-36.6268744033, -51.6106287026))
        make_face()
        with BuildLine():
            Line((60.2670431009, -39.6617550661), (60.2670431009, -18.6617550661))
            ThreePointArc((60.2670431009, -18.6617550661), (53.7513993929, -33.4986323432), (43.6404220332, -46.1617550661))
            Line((43.6404220332, -46.1617550661), (53.7670431009, -46.1617550661))
            ThreePointArc((53.7670431009, -46.1617550661), (54.9789878574, -42.3820101355), (58.1628805597, -40.0117550661))
            ThreePointArc((58.1628805597, -40.0117550661), (59.2005066506, -39.7498520725), (60.2670431009, -39.6617550661))
        make_face()
        with BuildLine():
            Line((53.7670431009, -46.1617550661), (43.6404220332, -46.1617550661))
            ThreePointArc((43.6404220332, -46.1617550661), (40.4930580078, -48.9960286021), (37.1609606052, -51.6106287026))
            Line((37.1609606052, -51.6106287026), (37.1609606052, -63.6147354858))
            ThreePointArc((37.1609606052, -63.6147354858), (38.6484141737, -64.009455869), (39.7444489138, -65.0897475648))
            ThreePointArc((39.7444489138, -65.0897475648), (48.4949826486, -58.7752920311), (56.25072261, -51.2724467721))
            ThreePointArc((56.25072261, -51.2724467721), (54.4208441995, -49.002874283), (53.7670431009, -46.1617550661))
        make_face()
    extrude(amount=F1_DEPTH)


solid = f1.part
